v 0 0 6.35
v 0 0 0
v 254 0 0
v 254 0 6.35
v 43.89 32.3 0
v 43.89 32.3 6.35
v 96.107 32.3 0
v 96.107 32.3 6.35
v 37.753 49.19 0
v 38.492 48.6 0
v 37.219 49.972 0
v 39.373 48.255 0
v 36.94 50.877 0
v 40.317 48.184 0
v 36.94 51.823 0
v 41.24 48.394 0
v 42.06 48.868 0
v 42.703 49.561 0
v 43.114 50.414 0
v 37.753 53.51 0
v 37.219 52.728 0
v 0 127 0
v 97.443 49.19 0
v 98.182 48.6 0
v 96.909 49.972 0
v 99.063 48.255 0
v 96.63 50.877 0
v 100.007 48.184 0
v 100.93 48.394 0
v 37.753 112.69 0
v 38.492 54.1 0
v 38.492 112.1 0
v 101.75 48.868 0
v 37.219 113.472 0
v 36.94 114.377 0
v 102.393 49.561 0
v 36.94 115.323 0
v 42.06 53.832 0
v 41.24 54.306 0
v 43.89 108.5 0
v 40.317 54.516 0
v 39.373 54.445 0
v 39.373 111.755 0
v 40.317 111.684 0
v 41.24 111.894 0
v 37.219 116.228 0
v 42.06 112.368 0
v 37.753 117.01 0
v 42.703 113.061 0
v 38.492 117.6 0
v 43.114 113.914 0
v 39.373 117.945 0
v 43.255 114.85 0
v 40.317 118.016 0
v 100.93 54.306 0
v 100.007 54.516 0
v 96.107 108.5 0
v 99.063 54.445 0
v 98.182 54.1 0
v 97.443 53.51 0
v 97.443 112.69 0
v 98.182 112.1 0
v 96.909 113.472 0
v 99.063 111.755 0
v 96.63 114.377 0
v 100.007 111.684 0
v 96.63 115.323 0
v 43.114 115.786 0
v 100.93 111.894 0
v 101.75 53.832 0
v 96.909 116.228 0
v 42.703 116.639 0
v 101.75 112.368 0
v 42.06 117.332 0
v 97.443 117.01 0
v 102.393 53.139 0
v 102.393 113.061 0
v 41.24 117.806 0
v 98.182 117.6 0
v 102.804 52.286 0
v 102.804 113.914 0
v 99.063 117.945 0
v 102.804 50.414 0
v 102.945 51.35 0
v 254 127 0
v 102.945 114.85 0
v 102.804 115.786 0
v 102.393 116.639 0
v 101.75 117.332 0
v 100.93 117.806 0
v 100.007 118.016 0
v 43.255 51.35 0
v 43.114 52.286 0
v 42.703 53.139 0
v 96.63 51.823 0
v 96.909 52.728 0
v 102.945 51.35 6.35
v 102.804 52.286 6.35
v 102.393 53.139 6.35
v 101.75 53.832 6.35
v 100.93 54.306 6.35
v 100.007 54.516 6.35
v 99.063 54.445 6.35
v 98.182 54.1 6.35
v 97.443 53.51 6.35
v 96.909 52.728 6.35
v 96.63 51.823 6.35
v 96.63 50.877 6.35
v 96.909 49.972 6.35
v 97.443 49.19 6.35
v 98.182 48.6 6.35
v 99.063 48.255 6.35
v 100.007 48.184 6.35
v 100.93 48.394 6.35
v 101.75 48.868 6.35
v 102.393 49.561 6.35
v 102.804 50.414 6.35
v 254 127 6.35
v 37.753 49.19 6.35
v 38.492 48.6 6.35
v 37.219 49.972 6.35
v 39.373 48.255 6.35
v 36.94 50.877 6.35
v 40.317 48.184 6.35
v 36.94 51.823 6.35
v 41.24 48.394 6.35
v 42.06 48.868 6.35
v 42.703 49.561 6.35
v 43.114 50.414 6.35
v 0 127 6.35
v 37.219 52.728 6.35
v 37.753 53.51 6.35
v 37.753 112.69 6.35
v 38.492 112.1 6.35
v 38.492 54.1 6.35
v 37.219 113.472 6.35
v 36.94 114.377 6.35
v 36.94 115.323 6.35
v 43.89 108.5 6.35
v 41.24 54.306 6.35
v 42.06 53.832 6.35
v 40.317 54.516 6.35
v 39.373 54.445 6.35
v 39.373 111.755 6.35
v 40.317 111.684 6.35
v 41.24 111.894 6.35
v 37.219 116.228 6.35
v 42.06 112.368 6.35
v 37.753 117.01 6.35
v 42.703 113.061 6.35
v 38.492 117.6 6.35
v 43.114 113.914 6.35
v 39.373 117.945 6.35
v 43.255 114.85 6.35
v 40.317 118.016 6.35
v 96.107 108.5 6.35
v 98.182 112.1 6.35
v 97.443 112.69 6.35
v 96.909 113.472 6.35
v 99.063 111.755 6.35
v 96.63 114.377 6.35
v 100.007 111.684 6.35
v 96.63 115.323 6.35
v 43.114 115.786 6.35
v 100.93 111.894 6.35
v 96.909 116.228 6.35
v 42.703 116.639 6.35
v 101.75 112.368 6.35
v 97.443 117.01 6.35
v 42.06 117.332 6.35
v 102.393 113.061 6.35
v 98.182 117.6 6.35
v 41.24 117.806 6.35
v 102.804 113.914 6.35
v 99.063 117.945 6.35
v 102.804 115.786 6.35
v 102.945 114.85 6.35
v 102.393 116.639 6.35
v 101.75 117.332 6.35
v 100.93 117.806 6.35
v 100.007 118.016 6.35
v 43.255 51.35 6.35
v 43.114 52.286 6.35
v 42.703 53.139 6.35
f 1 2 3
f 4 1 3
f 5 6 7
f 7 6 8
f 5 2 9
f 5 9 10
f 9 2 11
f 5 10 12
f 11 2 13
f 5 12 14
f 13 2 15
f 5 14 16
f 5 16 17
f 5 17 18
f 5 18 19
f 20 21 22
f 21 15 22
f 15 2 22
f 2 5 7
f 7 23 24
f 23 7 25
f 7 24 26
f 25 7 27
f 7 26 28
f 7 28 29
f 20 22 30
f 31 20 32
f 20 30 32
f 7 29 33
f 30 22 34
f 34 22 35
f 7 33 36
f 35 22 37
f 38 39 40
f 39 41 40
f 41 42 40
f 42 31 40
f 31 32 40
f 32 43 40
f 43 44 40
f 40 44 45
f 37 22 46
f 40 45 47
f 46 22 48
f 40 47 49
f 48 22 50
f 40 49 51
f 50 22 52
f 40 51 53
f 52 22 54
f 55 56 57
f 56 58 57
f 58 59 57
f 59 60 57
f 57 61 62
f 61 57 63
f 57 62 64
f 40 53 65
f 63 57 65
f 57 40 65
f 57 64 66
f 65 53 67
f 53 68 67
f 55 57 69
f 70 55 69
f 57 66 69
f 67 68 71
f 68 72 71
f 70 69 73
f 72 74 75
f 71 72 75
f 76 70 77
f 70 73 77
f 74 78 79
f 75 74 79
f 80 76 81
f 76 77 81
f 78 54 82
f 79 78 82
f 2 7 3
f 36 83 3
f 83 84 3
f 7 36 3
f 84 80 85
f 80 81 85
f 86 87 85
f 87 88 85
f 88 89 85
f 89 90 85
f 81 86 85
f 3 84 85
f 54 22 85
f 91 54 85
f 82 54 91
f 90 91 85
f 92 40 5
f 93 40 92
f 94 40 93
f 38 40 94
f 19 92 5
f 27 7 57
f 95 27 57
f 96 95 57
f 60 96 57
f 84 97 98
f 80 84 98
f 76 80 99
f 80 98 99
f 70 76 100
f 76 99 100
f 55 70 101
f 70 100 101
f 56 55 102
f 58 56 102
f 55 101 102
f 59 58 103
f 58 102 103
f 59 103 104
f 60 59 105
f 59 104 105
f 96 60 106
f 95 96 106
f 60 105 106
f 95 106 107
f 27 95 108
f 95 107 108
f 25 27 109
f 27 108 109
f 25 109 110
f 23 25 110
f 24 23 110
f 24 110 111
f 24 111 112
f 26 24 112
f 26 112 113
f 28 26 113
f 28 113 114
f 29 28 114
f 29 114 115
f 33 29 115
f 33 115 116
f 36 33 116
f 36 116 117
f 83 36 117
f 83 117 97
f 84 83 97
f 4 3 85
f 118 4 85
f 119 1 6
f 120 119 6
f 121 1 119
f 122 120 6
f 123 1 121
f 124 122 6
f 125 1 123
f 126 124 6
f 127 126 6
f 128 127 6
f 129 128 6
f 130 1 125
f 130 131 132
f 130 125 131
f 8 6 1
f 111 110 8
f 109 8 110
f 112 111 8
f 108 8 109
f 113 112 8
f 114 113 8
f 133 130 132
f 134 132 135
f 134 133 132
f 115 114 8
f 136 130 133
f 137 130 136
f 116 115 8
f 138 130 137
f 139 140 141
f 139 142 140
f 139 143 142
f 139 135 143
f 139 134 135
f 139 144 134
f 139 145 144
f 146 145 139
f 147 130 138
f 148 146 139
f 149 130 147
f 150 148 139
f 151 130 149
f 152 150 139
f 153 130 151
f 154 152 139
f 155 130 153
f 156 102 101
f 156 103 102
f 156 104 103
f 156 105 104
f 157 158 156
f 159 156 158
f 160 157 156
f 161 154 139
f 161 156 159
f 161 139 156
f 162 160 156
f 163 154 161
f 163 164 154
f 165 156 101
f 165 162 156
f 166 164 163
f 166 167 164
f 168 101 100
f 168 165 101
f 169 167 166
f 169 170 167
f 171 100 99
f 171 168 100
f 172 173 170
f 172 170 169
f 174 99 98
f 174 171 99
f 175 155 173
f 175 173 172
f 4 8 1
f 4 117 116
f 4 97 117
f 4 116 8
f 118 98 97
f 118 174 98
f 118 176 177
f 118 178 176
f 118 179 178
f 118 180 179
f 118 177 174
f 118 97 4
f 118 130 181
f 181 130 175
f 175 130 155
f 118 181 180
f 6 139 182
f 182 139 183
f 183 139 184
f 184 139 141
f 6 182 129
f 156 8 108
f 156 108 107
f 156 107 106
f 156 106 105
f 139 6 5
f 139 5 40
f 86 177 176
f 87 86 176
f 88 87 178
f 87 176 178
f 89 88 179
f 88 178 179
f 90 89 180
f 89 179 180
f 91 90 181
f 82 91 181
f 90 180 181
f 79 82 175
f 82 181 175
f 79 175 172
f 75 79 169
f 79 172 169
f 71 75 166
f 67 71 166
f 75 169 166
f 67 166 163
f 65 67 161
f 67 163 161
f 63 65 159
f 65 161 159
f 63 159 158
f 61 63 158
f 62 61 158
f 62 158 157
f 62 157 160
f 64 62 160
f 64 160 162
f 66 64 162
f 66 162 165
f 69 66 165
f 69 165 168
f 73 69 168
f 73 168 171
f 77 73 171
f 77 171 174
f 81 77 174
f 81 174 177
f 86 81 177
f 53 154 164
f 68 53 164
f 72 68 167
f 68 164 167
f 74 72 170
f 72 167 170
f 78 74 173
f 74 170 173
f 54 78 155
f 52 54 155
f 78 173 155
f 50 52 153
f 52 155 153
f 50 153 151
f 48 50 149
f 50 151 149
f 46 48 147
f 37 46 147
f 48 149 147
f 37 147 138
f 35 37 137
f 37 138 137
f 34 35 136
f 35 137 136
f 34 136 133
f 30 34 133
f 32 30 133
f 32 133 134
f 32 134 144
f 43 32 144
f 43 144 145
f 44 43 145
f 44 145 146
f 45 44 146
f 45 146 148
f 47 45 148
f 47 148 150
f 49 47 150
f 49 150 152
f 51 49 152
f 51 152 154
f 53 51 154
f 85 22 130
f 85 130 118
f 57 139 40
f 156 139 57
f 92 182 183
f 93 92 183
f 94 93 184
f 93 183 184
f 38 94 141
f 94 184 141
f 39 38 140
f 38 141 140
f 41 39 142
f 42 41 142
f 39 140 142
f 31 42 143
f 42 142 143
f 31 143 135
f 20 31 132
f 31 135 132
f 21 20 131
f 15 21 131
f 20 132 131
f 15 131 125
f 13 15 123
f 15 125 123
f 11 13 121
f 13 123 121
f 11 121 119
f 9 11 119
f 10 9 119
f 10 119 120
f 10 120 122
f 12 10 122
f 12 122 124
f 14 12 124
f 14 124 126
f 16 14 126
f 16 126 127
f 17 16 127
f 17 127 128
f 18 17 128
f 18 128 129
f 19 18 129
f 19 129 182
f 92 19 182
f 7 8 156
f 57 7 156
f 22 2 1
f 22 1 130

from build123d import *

# Parameters (mm, degrees)
SKETCH1_W           = 254
SKETCH1_H           = 127
BOSS_EXTRUDE1_DEPTH = 6.35
SKETCH4_W           = 52.216720723
SKETCH4_H           = 76.2
SKETCH4_R           = 3.175
CUT_EXTRUDE3_DEPTH  = 285.051619429


with BuildPart() as part:
    # Sketch1 → Boss-Extrude1 (new body)
    with BuildSketch(Plane.XY):
        with Locations((127, 63.5)):
            Rectangle(SKETCH1_W, SKETCH1_H)
    extrude(amount=BOSS_EXTRUDE1_DEPTH)

    # Sketch4 → Cut-Extrude3 (cut, through all)
    with BuildSketch(Plane.XY.offset(6.35)):
        with Locations((69.998360362, 70.4)):
            Rectangle(SKETCH4_W, SKETCH4_H)
        with Locations((99.77, 114.85)):
            Circle(SKETCH4_R)
        with Locations((40.08, 51.35)):
            Circle(SKETCH4_R)
        with Locations((99.77, 51.35)):
            Circle(SKETCH4_R)
        with Locations((40.08, 114.85)):
            Circle(SKETCH4_R)
    extrude(amount=-CUT_EXTRUDE3_DEPTH, mode=Mode.SUBTRACT)


solid = part.part
